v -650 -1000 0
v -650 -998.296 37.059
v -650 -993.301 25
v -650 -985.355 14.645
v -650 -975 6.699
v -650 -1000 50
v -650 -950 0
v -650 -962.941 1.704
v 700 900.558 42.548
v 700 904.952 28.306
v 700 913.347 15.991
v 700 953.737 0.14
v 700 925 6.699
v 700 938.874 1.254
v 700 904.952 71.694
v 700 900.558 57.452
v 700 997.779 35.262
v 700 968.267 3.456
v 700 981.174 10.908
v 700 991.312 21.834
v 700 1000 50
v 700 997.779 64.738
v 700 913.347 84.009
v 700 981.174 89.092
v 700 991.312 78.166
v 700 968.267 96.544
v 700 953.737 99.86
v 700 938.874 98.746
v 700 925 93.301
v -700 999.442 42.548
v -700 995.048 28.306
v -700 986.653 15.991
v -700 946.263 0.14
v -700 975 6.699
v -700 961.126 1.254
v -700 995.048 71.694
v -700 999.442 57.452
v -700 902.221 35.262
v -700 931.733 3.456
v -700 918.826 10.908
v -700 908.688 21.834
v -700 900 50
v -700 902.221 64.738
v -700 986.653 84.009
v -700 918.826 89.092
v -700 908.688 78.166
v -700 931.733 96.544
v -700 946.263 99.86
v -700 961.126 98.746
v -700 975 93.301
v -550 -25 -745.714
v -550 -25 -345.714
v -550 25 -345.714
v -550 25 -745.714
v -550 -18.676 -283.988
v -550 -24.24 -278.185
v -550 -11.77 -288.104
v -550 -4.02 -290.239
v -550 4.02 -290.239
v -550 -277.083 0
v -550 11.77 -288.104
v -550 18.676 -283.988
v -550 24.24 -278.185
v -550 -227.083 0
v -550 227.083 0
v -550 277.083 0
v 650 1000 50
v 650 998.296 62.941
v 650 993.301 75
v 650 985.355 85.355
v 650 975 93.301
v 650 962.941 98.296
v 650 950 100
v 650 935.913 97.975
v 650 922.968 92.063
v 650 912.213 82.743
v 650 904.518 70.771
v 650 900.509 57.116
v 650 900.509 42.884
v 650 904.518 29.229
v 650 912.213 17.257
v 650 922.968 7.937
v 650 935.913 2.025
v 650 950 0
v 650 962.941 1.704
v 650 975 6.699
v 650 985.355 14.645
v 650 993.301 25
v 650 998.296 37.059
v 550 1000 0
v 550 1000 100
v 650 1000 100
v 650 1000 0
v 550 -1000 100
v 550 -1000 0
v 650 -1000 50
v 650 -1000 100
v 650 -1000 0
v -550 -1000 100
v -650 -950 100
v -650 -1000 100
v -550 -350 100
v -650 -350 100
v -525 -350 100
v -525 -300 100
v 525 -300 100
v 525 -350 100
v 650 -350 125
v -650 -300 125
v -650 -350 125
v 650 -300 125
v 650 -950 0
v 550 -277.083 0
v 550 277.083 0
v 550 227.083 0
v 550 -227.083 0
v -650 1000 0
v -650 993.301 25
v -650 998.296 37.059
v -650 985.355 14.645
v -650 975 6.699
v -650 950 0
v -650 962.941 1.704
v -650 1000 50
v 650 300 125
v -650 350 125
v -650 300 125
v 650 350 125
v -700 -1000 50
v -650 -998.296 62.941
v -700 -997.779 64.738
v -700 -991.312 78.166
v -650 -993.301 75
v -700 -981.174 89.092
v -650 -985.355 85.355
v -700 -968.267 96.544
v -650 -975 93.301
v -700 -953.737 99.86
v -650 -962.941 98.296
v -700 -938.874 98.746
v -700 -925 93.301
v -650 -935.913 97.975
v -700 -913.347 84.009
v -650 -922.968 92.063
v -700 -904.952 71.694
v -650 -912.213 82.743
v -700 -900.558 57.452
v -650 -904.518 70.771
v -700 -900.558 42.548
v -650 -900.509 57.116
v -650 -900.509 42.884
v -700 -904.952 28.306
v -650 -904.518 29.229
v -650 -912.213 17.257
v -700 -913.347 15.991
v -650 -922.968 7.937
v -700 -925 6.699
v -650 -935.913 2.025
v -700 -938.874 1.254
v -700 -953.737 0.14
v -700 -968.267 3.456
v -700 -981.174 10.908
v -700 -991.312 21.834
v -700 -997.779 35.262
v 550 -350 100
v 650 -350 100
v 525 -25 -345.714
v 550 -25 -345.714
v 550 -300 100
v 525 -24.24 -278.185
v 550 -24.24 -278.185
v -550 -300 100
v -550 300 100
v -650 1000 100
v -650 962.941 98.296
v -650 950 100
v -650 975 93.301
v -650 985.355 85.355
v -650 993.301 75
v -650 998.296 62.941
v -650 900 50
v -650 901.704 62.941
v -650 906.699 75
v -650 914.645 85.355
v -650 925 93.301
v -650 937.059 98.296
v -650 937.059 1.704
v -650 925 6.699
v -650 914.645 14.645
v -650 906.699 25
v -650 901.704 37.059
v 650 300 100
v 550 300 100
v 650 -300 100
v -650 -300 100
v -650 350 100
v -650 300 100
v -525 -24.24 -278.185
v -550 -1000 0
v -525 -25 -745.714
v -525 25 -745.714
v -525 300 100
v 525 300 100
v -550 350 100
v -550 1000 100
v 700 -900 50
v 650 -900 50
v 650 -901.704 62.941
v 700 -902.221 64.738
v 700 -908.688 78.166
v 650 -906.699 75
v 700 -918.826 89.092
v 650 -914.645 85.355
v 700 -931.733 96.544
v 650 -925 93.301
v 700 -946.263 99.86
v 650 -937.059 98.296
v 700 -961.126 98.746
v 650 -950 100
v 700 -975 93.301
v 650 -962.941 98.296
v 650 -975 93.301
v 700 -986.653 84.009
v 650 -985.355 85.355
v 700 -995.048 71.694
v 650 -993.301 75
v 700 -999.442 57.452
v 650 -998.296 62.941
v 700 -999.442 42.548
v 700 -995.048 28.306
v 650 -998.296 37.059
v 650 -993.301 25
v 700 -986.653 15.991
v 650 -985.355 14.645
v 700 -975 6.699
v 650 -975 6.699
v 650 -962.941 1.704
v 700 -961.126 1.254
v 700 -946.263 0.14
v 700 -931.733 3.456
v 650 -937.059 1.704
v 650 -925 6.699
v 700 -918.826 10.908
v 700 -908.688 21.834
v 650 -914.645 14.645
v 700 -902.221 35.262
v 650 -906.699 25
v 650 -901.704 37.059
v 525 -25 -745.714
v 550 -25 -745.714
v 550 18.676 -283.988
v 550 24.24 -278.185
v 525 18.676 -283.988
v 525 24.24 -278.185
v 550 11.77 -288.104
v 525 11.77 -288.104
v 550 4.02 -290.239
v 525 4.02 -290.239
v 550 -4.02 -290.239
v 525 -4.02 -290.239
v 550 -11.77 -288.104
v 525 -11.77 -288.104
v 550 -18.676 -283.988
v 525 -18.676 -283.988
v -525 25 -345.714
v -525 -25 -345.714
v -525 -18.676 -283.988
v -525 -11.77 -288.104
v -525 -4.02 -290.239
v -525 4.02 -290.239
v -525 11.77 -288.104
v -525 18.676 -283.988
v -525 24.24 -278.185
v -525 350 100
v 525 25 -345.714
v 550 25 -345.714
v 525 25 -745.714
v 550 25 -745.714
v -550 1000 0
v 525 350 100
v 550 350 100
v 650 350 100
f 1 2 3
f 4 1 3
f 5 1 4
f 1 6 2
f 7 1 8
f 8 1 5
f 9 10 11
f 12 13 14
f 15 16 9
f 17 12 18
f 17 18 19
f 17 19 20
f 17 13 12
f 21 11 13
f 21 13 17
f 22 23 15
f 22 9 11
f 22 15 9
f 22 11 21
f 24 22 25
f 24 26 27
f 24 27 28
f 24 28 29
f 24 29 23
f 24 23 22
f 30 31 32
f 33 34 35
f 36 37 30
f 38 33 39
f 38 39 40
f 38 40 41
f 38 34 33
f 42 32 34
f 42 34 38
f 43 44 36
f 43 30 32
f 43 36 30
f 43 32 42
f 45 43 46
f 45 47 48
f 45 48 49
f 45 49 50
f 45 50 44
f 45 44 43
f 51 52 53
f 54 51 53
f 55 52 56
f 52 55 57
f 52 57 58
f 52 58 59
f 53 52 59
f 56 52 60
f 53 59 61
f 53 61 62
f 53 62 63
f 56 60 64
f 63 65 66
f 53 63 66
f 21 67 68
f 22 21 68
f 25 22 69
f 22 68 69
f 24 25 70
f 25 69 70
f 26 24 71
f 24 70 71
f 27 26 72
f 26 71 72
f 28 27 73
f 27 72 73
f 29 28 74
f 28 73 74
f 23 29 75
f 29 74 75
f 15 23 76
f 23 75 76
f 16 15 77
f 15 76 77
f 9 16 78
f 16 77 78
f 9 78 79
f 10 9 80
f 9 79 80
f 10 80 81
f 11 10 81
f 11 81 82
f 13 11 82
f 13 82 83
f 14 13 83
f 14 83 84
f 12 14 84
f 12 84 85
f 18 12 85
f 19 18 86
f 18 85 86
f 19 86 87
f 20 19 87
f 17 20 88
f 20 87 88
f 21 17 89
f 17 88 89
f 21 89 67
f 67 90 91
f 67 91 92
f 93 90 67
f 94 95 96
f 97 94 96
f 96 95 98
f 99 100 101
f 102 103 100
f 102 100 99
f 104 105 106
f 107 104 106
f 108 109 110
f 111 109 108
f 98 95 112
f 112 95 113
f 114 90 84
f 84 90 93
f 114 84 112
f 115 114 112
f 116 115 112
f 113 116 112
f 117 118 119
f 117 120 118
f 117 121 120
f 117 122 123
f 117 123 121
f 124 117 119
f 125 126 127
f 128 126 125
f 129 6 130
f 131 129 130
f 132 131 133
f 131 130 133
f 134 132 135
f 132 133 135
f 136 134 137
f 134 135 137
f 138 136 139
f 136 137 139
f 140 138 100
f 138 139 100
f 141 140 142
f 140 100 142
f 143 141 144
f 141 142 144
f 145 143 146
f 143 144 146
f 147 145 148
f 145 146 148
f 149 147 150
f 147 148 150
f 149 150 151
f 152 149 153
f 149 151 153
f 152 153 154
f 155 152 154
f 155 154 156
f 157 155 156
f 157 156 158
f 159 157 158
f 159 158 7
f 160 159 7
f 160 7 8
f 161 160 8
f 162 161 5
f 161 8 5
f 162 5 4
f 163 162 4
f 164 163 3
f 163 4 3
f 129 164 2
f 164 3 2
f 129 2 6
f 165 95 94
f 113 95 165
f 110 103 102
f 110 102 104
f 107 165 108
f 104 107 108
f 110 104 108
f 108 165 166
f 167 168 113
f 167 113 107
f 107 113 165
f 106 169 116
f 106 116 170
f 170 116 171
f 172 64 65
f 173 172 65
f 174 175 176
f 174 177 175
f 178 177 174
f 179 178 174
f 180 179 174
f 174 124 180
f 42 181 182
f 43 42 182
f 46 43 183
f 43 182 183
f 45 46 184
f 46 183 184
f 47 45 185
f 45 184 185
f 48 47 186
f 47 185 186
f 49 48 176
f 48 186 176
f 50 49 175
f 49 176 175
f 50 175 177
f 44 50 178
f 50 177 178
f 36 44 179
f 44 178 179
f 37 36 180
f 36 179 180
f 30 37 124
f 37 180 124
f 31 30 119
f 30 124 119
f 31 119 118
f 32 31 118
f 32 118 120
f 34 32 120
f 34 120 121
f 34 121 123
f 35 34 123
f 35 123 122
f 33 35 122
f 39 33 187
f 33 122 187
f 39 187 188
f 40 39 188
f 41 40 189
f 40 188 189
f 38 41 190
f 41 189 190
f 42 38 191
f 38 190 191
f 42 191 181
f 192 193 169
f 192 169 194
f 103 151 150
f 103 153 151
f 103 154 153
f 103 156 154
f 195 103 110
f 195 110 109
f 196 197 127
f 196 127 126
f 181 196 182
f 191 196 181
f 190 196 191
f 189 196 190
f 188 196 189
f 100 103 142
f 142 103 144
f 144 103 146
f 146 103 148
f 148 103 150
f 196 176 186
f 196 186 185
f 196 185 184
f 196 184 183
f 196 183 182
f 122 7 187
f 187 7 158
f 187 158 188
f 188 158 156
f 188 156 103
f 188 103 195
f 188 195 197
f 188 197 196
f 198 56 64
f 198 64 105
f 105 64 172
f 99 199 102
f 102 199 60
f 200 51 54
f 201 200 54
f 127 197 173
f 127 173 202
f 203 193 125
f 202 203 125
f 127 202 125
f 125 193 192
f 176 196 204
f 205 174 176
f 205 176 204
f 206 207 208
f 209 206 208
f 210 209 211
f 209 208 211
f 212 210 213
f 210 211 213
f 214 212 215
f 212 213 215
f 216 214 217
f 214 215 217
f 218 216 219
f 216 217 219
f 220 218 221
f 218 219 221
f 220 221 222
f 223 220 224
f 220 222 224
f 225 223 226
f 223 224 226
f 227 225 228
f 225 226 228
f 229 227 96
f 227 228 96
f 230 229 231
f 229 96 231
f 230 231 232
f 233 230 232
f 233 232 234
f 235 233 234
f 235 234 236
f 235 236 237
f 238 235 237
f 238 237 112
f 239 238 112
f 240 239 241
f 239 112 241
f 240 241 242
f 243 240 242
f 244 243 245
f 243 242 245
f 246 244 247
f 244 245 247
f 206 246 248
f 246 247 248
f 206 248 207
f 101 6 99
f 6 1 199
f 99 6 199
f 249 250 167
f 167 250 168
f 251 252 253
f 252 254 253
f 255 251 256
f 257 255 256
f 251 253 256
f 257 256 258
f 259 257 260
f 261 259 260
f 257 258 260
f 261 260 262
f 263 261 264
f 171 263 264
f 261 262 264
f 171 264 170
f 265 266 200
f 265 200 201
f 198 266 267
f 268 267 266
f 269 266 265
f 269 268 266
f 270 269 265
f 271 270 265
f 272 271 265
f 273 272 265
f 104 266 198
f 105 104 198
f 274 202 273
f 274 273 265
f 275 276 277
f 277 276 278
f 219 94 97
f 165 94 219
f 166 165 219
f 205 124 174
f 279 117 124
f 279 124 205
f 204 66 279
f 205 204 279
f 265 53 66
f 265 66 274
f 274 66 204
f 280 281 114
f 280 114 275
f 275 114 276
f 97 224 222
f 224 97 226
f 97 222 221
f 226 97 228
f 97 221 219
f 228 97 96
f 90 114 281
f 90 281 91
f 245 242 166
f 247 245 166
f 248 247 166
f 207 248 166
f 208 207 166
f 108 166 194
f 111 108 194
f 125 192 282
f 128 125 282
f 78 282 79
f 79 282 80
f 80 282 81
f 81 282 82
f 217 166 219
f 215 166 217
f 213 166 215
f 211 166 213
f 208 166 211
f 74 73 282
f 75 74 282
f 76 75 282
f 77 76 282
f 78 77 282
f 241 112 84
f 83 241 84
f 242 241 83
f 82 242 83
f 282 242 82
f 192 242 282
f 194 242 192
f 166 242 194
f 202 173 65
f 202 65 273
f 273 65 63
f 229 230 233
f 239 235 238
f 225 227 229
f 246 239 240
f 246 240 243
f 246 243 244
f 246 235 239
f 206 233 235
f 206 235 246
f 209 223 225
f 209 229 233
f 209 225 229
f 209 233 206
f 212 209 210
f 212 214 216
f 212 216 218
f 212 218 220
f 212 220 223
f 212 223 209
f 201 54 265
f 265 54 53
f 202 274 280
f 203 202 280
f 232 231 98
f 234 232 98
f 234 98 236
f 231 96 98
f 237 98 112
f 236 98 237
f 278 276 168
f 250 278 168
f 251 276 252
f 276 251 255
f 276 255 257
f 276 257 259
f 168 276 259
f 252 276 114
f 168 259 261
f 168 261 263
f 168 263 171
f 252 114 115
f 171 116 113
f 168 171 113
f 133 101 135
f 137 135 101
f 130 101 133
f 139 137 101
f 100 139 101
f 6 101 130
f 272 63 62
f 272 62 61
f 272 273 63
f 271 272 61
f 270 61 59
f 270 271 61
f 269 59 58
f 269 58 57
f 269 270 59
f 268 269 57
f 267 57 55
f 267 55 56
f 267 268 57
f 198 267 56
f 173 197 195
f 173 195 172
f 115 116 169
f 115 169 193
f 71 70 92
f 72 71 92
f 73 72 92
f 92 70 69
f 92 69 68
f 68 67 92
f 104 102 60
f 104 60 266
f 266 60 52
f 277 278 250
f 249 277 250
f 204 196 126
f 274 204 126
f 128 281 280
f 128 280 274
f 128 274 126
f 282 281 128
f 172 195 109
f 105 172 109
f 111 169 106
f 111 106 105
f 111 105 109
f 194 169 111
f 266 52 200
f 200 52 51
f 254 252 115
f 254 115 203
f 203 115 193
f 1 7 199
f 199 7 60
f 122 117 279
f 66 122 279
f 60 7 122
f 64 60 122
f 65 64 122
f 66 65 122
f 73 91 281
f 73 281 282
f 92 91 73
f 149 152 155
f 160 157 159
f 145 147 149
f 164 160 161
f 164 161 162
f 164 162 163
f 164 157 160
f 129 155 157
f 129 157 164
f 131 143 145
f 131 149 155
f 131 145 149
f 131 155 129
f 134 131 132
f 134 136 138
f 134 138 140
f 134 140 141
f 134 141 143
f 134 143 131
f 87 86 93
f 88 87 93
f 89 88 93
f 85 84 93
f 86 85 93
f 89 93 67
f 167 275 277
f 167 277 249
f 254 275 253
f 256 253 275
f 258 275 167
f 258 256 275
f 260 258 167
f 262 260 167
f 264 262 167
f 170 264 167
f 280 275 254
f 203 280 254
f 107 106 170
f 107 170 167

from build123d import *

# Parameters (mm, degrees)
F0_W      = 100
F0_H      = 2000
F1_DEPTH  = 100
F2_W      = 1300
F2_H      = 50
F3_DEPTH  = 25
F4_R      = 50
F5_DEPTH  = 50
F6_R      = 50
F7_DEPTH  = 50
F9_DEPTH  = 25
F11_DEPTH = 25
F12_R     = 30


with BuildPart() as f1:
    # F0 (on Top) → F1 (new body)
    with BuildSketch(Plane.XY):
        with Locations((600, 0)):
            Rectangle(F0_W, F0_H)
        with Locations((-600, 0)):
            Rectangle(F0_W, F0_H)
    extrude(amount=F1_DEPTH)

    # F2 (on face) → F3 (join)
    with BuildSketch(Plane.XY.offset(100)):
        with Locations((0, -325)):
            Rectangle(F2_W, F2_H)
        with Locations((0, 325)):
            Rectangle(F2_W, F2_H)
    extrude(amount=F3_DEPTH)

    # F4 (on face) → F5 (join)
    with BuildSketch(Plane(origin=(-650, 0, 0), x_dir=(0, -1, 0), z_dir=(-1, 0, 0))):
        with Locations((-950, 50)):
            Circle(F4_R)
        with Locations((950, 50)):
            Circle(F4_R)
    extrude(amount=F5_DEPTH)

    # F6 (on face) → F7 (join)
    with BuildSketch(Plane.YZ.offset(650)):
        with Locations((-950, 50)):
            Circle(F6_R)
        with Locations((950, 50)):
            Circle(F6_R)
    extrude(amount=F7_DEPTH)

    # F8 (on face) → F9 (join)
    with BuildSketch(Plane.YZ.offset(-550)):
        Polygon((-300, 100), (-350, 100), (-25, -345.714286), (-25, -745.714286), (25, -745.714286), (25, -345.714286), (350, 100), (300, 100), (0, -311.428571), align=None)
    extrude(amount=F9_DEPTH)

    # F10 (on face) → F11 (join)
    with BuildSketch(Plane(origin=(550, 0, 0), x_dir=(0, -1, 0), z_dir=(-1, 0, 0))):
        Polygon((25, -345.714286), (350, 100), (300, 100), (0, -311.428571), (-300, 100), (-350, 100), (-25, -345.714286), (-25, -745.714286), (25, -745.714286), align=None)
    extrude(amount=F11_DEPTH)

    # F12
    f12_edges = [f1.edges().sort_by_distance(p)[0] for p in [
        (-537.5, 0, -311.428571),
        (537.5, 0, -311.428571),
    ]]
    fillet(f12_edges, radius=F12_R)


solid = f1.part
